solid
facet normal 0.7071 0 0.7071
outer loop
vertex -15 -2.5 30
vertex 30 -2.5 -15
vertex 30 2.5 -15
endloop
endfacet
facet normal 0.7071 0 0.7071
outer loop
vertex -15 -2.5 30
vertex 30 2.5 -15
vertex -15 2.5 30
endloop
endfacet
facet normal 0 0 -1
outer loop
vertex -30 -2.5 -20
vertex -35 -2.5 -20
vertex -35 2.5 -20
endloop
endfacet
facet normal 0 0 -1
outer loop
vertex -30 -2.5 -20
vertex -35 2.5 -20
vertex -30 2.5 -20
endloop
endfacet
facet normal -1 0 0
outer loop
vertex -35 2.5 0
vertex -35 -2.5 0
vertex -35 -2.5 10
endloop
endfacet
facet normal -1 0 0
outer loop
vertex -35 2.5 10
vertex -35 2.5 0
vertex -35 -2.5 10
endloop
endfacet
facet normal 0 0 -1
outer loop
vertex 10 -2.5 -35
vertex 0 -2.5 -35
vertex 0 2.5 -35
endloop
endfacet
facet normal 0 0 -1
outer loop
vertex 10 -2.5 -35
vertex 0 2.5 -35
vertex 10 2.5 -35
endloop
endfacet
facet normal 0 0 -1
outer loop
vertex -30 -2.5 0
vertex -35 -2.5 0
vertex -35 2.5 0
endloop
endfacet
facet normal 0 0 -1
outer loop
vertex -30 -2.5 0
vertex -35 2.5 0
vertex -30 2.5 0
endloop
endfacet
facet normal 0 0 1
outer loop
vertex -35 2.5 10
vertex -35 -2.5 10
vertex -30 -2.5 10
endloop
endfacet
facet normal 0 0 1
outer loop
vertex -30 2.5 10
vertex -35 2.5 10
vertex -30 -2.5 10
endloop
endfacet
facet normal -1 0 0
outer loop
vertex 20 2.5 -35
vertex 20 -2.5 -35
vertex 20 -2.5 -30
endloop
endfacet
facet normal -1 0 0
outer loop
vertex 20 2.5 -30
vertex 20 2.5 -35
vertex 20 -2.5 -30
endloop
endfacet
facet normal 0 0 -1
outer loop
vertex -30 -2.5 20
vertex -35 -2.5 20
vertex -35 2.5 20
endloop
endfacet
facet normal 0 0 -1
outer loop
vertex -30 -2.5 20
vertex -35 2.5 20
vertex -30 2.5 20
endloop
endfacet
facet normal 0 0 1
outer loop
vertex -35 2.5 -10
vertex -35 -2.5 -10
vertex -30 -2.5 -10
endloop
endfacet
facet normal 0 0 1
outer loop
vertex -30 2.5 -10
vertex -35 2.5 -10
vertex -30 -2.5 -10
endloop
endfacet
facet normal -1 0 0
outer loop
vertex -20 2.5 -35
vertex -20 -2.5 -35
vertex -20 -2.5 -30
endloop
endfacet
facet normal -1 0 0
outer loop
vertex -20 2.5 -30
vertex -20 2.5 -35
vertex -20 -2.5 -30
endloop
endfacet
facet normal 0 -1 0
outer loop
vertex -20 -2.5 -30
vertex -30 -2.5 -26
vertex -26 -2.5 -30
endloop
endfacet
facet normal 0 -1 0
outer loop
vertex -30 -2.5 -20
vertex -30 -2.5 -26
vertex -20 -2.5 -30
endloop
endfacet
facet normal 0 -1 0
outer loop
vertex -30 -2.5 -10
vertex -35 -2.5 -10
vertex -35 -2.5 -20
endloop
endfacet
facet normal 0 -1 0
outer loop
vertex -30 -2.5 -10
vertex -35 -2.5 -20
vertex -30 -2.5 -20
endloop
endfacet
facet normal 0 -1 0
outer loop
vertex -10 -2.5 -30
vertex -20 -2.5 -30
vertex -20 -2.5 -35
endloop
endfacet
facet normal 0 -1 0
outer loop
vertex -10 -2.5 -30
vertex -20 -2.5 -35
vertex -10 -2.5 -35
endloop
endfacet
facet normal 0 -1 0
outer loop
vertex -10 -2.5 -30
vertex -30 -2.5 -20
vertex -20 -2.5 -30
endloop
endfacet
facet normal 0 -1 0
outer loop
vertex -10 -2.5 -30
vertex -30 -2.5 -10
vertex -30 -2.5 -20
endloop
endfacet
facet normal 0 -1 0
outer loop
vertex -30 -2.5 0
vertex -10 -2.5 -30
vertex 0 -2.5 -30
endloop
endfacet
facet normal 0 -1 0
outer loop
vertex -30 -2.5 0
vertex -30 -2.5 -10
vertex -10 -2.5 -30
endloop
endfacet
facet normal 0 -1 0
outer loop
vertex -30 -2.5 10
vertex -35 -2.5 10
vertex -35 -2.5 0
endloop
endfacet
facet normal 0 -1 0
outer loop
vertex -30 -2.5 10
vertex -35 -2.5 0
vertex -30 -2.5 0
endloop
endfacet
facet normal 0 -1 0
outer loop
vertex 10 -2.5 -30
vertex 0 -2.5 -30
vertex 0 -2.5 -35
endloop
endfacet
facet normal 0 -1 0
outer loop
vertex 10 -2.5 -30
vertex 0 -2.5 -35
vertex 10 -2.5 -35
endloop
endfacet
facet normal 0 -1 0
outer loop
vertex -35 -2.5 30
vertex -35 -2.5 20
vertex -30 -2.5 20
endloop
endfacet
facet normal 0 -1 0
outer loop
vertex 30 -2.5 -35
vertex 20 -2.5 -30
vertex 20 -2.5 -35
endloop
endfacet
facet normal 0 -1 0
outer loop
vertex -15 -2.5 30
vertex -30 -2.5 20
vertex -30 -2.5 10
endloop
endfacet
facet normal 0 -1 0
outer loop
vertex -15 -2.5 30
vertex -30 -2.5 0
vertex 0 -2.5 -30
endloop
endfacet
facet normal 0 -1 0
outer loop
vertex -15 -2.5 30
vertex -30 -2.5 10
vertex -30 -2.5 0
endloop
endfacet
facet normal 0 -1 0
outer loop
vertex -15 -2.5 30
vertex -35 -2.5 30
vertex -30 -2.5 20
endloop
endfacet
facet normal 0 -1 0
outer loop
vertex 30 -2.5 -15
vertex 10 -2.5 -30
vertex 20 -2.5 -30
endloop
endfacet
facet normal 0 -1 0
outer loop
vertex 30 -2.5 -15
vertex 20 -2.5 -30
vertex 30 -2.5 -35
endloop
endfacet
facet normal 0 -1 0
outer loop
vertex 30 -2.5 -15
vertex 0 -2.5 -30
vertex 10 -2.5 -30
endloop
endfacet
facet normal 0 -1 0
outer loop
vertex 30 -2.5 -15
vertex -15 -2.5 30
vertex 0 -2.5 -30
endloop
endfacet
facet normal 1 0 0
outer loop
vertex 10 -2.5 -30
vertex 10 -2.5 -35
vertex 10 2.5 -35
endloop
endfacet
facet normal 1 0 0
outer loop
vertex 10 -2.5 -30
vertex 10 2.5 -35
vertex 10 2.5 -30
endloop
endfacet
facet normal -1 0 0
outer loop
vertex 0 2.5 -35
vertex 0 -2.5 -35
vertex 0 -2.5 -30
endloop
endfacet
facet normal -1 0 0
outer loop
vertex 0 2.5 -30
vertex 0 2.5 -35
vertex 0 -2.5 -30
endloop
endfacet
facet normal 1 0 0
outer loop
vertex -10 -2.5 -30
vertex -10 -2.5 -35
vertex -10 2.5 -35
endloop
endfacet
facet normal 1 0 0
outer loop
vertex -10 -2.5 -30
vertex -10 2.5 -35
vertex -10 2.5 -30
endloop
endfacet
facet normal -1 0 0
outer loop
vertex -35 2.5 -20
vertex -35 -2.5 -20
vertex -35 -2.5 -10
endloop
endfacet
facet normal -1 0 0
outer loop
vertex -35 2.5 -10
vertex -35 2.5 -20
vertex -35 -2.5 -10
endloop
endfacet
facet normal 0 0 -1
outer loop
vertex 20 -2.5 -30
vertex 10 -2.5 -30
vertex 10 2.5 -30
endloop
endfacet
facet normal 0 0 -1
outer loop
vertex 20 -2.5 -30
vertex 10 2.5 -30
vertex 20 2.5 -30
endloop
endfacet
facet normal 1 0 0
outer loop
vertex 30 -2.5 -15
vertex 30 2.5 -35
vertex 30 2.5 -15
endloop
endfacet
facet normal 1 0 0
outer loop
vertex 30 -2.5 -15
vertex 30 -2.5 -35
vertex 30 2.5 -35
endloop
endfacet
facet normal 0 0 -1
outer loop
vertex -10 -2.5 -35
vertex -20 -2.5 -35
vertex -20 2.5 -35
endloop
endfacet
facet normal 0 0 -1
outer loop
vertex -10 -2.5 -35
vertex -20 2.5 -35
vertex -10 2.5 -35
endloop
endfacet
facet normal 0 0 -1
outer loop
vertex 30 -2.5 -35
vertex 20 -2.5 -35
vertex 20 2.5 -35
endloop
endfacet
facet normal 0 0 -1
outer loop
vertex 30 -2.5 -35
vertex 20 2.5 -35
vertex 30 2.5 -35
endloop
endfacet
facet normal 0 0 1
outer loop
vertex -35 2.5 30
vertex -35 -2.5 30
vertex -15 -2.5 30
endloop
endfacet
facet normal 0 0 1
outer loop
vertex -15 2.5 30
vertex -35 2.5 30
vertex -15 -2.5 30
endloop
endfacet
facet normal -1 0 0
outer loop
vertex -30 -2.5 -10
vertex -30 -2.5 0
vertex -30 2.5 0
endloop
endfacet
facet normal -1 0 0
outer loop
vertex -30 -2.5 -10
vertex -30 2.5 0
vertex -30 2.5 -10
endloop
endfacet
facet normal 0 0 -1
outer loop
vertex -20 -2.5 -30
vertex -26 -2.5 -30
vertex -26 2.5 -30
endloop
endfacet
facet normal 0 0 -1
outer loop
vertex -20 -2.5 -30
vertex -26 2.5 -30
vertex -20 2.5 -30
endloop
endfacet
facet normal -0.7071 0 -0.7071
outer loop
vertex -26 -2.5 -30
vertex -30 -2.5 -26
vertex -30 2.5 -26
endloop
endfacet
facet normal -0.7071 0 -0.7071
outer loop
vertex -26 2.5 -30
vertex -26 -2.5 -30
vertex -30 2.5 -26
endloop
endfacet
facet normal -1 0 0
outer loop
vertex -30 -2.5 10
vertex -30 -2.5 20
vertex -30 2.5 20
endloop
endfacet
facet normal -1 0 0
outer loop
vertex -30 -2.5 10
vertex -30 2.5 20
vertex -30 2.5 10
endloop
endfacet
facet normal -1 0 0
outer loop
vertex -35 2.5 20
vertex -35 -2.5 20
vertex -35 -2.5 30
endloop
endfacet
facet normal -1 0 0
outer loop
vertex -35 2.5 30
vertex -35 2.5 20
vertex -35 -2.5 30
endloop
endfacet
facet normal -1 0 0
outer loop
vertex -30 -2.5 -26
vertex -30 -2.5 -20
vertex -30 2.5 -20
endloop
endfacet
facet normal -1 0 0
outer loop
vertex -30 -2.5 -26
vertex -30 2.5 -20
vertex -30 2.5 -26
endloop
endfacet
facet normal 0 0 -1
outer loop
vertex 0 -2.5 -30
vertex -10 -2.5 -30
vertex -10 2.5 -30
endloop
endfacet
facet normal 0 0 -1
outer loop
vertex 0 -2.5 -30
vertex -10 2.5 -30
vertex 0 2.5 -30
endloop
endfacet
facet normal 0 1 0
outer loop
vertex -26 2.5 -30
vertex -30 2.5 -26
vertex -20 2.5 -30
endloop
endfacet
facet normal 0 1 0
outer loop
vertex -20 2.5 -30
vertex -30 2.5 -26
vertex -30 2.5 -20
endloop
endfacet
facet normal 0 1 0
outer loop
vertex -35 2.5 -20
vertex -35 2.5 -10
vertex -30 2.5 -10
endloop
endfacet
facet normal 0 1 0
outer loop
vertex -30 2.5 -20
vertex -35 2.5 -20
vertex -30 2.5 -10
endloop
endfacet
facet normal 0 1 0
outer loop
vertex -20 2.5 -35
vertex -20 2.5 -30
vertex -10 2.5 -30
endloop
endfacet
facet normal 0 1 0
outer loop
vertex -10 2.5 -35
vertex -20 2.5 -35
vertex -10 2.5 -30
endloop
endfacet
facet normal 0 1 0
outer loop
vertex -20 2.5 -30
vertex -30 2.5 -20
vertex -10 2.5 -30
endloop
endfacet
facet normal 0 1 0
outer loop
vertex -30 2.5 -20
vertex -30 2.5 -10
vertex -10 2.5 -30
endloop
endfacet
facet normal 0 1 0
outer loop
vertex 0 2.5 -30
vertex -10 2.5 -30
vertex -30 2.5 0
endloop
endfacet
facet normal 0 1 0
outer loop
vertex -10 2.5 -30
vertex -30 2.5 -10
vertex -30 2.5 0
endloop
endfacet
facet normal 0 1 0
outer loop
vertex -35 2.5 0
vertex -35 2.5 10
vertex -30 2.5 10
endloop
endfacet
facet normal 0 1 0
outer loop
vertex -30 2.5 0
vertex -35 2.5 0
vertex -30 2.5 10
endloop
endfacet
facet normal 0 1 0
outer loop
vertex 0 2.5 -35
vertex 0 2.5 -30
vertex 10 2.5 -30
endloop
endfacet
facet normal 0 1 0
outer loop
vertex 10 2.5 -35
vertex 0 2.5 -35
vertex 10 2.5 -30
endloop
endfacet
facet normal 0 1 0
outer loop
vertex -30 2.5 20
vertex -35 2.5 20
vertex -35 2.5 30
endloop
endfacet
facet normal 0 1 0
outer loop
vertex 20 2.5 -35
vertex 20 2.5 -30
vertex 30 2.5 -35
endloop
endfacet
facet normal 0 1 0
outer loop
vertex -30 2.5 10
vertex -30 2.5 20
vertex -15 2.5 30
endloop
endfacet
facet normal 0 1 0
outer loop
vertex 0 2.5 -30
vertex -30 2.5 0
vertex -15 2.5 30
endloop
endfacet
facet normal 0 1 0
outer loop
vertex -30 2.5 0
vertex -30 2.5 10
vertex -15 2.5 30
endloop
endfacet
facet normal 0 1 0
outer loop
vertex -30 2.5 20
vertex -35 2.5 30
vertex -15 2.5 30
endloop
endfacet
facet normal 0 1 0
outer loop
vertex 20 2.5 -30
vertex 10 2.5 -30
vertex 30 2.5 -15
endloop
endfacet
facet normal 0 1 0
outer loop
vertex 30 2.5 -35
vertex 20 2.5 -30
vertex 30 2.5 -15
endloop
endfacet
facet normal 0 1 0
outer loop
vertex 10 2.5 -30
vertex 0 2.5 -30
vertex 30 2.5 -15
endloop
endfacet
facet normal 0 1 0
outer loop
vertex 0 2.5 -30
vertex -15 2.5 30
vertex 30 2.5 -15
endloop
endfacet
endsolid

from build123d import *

# Parameters (mm, degrees)
F1_DEPTH = 2.5
F2_W     = 5
F2_H     = 10
F2_W_2   = 10
F2_H_2   = 5
F3_DEPTH = 5
F4_SIZE  = 4


with BuildPart() as f1:
    # F0 (on Front) → F1 (new body, symmetric)
    with BuildSketch(Plane.XZ):
        Polygon((-30, -30), (30, -30), (30, -15), (-15, 30), (-30, 30), align=None)
    extrude(amount=F1_DEPTH, both=True)

    # F2 (on face) → F3 (join, through all)
    with BuildSketch(Plane.XZ.offset(2.5)):
        with Locations((-32.5, 25)):
            Rectangle(F2_W, F2_H)
        with Locations((-32.5, 5)):
            Rectangle(F2_W, F2_H)
        with Locations((-32.5, -15)):
            Rectangle(F2_W, F2_H)
        with Locations((25, -32.5)):
            Rectangle(F2_W_2, F2_H_2)
        with Locations((5, -32.5)):
            Rectangle(F2_W_2, F2_H_2)
        with Locations((-15, -32.5)):
            Rectangle(F2_W_2, F2_H_2)
    extrude(amount=-F3_DEPTH)

    # F4
    f4_edges = [f1.edges().sort_by_distance(p)[0] for p in [
        (-30, 0, -30),
    ]]
    chamfer(f4_edges, length=F4_SIZE)


solid = f1.part
